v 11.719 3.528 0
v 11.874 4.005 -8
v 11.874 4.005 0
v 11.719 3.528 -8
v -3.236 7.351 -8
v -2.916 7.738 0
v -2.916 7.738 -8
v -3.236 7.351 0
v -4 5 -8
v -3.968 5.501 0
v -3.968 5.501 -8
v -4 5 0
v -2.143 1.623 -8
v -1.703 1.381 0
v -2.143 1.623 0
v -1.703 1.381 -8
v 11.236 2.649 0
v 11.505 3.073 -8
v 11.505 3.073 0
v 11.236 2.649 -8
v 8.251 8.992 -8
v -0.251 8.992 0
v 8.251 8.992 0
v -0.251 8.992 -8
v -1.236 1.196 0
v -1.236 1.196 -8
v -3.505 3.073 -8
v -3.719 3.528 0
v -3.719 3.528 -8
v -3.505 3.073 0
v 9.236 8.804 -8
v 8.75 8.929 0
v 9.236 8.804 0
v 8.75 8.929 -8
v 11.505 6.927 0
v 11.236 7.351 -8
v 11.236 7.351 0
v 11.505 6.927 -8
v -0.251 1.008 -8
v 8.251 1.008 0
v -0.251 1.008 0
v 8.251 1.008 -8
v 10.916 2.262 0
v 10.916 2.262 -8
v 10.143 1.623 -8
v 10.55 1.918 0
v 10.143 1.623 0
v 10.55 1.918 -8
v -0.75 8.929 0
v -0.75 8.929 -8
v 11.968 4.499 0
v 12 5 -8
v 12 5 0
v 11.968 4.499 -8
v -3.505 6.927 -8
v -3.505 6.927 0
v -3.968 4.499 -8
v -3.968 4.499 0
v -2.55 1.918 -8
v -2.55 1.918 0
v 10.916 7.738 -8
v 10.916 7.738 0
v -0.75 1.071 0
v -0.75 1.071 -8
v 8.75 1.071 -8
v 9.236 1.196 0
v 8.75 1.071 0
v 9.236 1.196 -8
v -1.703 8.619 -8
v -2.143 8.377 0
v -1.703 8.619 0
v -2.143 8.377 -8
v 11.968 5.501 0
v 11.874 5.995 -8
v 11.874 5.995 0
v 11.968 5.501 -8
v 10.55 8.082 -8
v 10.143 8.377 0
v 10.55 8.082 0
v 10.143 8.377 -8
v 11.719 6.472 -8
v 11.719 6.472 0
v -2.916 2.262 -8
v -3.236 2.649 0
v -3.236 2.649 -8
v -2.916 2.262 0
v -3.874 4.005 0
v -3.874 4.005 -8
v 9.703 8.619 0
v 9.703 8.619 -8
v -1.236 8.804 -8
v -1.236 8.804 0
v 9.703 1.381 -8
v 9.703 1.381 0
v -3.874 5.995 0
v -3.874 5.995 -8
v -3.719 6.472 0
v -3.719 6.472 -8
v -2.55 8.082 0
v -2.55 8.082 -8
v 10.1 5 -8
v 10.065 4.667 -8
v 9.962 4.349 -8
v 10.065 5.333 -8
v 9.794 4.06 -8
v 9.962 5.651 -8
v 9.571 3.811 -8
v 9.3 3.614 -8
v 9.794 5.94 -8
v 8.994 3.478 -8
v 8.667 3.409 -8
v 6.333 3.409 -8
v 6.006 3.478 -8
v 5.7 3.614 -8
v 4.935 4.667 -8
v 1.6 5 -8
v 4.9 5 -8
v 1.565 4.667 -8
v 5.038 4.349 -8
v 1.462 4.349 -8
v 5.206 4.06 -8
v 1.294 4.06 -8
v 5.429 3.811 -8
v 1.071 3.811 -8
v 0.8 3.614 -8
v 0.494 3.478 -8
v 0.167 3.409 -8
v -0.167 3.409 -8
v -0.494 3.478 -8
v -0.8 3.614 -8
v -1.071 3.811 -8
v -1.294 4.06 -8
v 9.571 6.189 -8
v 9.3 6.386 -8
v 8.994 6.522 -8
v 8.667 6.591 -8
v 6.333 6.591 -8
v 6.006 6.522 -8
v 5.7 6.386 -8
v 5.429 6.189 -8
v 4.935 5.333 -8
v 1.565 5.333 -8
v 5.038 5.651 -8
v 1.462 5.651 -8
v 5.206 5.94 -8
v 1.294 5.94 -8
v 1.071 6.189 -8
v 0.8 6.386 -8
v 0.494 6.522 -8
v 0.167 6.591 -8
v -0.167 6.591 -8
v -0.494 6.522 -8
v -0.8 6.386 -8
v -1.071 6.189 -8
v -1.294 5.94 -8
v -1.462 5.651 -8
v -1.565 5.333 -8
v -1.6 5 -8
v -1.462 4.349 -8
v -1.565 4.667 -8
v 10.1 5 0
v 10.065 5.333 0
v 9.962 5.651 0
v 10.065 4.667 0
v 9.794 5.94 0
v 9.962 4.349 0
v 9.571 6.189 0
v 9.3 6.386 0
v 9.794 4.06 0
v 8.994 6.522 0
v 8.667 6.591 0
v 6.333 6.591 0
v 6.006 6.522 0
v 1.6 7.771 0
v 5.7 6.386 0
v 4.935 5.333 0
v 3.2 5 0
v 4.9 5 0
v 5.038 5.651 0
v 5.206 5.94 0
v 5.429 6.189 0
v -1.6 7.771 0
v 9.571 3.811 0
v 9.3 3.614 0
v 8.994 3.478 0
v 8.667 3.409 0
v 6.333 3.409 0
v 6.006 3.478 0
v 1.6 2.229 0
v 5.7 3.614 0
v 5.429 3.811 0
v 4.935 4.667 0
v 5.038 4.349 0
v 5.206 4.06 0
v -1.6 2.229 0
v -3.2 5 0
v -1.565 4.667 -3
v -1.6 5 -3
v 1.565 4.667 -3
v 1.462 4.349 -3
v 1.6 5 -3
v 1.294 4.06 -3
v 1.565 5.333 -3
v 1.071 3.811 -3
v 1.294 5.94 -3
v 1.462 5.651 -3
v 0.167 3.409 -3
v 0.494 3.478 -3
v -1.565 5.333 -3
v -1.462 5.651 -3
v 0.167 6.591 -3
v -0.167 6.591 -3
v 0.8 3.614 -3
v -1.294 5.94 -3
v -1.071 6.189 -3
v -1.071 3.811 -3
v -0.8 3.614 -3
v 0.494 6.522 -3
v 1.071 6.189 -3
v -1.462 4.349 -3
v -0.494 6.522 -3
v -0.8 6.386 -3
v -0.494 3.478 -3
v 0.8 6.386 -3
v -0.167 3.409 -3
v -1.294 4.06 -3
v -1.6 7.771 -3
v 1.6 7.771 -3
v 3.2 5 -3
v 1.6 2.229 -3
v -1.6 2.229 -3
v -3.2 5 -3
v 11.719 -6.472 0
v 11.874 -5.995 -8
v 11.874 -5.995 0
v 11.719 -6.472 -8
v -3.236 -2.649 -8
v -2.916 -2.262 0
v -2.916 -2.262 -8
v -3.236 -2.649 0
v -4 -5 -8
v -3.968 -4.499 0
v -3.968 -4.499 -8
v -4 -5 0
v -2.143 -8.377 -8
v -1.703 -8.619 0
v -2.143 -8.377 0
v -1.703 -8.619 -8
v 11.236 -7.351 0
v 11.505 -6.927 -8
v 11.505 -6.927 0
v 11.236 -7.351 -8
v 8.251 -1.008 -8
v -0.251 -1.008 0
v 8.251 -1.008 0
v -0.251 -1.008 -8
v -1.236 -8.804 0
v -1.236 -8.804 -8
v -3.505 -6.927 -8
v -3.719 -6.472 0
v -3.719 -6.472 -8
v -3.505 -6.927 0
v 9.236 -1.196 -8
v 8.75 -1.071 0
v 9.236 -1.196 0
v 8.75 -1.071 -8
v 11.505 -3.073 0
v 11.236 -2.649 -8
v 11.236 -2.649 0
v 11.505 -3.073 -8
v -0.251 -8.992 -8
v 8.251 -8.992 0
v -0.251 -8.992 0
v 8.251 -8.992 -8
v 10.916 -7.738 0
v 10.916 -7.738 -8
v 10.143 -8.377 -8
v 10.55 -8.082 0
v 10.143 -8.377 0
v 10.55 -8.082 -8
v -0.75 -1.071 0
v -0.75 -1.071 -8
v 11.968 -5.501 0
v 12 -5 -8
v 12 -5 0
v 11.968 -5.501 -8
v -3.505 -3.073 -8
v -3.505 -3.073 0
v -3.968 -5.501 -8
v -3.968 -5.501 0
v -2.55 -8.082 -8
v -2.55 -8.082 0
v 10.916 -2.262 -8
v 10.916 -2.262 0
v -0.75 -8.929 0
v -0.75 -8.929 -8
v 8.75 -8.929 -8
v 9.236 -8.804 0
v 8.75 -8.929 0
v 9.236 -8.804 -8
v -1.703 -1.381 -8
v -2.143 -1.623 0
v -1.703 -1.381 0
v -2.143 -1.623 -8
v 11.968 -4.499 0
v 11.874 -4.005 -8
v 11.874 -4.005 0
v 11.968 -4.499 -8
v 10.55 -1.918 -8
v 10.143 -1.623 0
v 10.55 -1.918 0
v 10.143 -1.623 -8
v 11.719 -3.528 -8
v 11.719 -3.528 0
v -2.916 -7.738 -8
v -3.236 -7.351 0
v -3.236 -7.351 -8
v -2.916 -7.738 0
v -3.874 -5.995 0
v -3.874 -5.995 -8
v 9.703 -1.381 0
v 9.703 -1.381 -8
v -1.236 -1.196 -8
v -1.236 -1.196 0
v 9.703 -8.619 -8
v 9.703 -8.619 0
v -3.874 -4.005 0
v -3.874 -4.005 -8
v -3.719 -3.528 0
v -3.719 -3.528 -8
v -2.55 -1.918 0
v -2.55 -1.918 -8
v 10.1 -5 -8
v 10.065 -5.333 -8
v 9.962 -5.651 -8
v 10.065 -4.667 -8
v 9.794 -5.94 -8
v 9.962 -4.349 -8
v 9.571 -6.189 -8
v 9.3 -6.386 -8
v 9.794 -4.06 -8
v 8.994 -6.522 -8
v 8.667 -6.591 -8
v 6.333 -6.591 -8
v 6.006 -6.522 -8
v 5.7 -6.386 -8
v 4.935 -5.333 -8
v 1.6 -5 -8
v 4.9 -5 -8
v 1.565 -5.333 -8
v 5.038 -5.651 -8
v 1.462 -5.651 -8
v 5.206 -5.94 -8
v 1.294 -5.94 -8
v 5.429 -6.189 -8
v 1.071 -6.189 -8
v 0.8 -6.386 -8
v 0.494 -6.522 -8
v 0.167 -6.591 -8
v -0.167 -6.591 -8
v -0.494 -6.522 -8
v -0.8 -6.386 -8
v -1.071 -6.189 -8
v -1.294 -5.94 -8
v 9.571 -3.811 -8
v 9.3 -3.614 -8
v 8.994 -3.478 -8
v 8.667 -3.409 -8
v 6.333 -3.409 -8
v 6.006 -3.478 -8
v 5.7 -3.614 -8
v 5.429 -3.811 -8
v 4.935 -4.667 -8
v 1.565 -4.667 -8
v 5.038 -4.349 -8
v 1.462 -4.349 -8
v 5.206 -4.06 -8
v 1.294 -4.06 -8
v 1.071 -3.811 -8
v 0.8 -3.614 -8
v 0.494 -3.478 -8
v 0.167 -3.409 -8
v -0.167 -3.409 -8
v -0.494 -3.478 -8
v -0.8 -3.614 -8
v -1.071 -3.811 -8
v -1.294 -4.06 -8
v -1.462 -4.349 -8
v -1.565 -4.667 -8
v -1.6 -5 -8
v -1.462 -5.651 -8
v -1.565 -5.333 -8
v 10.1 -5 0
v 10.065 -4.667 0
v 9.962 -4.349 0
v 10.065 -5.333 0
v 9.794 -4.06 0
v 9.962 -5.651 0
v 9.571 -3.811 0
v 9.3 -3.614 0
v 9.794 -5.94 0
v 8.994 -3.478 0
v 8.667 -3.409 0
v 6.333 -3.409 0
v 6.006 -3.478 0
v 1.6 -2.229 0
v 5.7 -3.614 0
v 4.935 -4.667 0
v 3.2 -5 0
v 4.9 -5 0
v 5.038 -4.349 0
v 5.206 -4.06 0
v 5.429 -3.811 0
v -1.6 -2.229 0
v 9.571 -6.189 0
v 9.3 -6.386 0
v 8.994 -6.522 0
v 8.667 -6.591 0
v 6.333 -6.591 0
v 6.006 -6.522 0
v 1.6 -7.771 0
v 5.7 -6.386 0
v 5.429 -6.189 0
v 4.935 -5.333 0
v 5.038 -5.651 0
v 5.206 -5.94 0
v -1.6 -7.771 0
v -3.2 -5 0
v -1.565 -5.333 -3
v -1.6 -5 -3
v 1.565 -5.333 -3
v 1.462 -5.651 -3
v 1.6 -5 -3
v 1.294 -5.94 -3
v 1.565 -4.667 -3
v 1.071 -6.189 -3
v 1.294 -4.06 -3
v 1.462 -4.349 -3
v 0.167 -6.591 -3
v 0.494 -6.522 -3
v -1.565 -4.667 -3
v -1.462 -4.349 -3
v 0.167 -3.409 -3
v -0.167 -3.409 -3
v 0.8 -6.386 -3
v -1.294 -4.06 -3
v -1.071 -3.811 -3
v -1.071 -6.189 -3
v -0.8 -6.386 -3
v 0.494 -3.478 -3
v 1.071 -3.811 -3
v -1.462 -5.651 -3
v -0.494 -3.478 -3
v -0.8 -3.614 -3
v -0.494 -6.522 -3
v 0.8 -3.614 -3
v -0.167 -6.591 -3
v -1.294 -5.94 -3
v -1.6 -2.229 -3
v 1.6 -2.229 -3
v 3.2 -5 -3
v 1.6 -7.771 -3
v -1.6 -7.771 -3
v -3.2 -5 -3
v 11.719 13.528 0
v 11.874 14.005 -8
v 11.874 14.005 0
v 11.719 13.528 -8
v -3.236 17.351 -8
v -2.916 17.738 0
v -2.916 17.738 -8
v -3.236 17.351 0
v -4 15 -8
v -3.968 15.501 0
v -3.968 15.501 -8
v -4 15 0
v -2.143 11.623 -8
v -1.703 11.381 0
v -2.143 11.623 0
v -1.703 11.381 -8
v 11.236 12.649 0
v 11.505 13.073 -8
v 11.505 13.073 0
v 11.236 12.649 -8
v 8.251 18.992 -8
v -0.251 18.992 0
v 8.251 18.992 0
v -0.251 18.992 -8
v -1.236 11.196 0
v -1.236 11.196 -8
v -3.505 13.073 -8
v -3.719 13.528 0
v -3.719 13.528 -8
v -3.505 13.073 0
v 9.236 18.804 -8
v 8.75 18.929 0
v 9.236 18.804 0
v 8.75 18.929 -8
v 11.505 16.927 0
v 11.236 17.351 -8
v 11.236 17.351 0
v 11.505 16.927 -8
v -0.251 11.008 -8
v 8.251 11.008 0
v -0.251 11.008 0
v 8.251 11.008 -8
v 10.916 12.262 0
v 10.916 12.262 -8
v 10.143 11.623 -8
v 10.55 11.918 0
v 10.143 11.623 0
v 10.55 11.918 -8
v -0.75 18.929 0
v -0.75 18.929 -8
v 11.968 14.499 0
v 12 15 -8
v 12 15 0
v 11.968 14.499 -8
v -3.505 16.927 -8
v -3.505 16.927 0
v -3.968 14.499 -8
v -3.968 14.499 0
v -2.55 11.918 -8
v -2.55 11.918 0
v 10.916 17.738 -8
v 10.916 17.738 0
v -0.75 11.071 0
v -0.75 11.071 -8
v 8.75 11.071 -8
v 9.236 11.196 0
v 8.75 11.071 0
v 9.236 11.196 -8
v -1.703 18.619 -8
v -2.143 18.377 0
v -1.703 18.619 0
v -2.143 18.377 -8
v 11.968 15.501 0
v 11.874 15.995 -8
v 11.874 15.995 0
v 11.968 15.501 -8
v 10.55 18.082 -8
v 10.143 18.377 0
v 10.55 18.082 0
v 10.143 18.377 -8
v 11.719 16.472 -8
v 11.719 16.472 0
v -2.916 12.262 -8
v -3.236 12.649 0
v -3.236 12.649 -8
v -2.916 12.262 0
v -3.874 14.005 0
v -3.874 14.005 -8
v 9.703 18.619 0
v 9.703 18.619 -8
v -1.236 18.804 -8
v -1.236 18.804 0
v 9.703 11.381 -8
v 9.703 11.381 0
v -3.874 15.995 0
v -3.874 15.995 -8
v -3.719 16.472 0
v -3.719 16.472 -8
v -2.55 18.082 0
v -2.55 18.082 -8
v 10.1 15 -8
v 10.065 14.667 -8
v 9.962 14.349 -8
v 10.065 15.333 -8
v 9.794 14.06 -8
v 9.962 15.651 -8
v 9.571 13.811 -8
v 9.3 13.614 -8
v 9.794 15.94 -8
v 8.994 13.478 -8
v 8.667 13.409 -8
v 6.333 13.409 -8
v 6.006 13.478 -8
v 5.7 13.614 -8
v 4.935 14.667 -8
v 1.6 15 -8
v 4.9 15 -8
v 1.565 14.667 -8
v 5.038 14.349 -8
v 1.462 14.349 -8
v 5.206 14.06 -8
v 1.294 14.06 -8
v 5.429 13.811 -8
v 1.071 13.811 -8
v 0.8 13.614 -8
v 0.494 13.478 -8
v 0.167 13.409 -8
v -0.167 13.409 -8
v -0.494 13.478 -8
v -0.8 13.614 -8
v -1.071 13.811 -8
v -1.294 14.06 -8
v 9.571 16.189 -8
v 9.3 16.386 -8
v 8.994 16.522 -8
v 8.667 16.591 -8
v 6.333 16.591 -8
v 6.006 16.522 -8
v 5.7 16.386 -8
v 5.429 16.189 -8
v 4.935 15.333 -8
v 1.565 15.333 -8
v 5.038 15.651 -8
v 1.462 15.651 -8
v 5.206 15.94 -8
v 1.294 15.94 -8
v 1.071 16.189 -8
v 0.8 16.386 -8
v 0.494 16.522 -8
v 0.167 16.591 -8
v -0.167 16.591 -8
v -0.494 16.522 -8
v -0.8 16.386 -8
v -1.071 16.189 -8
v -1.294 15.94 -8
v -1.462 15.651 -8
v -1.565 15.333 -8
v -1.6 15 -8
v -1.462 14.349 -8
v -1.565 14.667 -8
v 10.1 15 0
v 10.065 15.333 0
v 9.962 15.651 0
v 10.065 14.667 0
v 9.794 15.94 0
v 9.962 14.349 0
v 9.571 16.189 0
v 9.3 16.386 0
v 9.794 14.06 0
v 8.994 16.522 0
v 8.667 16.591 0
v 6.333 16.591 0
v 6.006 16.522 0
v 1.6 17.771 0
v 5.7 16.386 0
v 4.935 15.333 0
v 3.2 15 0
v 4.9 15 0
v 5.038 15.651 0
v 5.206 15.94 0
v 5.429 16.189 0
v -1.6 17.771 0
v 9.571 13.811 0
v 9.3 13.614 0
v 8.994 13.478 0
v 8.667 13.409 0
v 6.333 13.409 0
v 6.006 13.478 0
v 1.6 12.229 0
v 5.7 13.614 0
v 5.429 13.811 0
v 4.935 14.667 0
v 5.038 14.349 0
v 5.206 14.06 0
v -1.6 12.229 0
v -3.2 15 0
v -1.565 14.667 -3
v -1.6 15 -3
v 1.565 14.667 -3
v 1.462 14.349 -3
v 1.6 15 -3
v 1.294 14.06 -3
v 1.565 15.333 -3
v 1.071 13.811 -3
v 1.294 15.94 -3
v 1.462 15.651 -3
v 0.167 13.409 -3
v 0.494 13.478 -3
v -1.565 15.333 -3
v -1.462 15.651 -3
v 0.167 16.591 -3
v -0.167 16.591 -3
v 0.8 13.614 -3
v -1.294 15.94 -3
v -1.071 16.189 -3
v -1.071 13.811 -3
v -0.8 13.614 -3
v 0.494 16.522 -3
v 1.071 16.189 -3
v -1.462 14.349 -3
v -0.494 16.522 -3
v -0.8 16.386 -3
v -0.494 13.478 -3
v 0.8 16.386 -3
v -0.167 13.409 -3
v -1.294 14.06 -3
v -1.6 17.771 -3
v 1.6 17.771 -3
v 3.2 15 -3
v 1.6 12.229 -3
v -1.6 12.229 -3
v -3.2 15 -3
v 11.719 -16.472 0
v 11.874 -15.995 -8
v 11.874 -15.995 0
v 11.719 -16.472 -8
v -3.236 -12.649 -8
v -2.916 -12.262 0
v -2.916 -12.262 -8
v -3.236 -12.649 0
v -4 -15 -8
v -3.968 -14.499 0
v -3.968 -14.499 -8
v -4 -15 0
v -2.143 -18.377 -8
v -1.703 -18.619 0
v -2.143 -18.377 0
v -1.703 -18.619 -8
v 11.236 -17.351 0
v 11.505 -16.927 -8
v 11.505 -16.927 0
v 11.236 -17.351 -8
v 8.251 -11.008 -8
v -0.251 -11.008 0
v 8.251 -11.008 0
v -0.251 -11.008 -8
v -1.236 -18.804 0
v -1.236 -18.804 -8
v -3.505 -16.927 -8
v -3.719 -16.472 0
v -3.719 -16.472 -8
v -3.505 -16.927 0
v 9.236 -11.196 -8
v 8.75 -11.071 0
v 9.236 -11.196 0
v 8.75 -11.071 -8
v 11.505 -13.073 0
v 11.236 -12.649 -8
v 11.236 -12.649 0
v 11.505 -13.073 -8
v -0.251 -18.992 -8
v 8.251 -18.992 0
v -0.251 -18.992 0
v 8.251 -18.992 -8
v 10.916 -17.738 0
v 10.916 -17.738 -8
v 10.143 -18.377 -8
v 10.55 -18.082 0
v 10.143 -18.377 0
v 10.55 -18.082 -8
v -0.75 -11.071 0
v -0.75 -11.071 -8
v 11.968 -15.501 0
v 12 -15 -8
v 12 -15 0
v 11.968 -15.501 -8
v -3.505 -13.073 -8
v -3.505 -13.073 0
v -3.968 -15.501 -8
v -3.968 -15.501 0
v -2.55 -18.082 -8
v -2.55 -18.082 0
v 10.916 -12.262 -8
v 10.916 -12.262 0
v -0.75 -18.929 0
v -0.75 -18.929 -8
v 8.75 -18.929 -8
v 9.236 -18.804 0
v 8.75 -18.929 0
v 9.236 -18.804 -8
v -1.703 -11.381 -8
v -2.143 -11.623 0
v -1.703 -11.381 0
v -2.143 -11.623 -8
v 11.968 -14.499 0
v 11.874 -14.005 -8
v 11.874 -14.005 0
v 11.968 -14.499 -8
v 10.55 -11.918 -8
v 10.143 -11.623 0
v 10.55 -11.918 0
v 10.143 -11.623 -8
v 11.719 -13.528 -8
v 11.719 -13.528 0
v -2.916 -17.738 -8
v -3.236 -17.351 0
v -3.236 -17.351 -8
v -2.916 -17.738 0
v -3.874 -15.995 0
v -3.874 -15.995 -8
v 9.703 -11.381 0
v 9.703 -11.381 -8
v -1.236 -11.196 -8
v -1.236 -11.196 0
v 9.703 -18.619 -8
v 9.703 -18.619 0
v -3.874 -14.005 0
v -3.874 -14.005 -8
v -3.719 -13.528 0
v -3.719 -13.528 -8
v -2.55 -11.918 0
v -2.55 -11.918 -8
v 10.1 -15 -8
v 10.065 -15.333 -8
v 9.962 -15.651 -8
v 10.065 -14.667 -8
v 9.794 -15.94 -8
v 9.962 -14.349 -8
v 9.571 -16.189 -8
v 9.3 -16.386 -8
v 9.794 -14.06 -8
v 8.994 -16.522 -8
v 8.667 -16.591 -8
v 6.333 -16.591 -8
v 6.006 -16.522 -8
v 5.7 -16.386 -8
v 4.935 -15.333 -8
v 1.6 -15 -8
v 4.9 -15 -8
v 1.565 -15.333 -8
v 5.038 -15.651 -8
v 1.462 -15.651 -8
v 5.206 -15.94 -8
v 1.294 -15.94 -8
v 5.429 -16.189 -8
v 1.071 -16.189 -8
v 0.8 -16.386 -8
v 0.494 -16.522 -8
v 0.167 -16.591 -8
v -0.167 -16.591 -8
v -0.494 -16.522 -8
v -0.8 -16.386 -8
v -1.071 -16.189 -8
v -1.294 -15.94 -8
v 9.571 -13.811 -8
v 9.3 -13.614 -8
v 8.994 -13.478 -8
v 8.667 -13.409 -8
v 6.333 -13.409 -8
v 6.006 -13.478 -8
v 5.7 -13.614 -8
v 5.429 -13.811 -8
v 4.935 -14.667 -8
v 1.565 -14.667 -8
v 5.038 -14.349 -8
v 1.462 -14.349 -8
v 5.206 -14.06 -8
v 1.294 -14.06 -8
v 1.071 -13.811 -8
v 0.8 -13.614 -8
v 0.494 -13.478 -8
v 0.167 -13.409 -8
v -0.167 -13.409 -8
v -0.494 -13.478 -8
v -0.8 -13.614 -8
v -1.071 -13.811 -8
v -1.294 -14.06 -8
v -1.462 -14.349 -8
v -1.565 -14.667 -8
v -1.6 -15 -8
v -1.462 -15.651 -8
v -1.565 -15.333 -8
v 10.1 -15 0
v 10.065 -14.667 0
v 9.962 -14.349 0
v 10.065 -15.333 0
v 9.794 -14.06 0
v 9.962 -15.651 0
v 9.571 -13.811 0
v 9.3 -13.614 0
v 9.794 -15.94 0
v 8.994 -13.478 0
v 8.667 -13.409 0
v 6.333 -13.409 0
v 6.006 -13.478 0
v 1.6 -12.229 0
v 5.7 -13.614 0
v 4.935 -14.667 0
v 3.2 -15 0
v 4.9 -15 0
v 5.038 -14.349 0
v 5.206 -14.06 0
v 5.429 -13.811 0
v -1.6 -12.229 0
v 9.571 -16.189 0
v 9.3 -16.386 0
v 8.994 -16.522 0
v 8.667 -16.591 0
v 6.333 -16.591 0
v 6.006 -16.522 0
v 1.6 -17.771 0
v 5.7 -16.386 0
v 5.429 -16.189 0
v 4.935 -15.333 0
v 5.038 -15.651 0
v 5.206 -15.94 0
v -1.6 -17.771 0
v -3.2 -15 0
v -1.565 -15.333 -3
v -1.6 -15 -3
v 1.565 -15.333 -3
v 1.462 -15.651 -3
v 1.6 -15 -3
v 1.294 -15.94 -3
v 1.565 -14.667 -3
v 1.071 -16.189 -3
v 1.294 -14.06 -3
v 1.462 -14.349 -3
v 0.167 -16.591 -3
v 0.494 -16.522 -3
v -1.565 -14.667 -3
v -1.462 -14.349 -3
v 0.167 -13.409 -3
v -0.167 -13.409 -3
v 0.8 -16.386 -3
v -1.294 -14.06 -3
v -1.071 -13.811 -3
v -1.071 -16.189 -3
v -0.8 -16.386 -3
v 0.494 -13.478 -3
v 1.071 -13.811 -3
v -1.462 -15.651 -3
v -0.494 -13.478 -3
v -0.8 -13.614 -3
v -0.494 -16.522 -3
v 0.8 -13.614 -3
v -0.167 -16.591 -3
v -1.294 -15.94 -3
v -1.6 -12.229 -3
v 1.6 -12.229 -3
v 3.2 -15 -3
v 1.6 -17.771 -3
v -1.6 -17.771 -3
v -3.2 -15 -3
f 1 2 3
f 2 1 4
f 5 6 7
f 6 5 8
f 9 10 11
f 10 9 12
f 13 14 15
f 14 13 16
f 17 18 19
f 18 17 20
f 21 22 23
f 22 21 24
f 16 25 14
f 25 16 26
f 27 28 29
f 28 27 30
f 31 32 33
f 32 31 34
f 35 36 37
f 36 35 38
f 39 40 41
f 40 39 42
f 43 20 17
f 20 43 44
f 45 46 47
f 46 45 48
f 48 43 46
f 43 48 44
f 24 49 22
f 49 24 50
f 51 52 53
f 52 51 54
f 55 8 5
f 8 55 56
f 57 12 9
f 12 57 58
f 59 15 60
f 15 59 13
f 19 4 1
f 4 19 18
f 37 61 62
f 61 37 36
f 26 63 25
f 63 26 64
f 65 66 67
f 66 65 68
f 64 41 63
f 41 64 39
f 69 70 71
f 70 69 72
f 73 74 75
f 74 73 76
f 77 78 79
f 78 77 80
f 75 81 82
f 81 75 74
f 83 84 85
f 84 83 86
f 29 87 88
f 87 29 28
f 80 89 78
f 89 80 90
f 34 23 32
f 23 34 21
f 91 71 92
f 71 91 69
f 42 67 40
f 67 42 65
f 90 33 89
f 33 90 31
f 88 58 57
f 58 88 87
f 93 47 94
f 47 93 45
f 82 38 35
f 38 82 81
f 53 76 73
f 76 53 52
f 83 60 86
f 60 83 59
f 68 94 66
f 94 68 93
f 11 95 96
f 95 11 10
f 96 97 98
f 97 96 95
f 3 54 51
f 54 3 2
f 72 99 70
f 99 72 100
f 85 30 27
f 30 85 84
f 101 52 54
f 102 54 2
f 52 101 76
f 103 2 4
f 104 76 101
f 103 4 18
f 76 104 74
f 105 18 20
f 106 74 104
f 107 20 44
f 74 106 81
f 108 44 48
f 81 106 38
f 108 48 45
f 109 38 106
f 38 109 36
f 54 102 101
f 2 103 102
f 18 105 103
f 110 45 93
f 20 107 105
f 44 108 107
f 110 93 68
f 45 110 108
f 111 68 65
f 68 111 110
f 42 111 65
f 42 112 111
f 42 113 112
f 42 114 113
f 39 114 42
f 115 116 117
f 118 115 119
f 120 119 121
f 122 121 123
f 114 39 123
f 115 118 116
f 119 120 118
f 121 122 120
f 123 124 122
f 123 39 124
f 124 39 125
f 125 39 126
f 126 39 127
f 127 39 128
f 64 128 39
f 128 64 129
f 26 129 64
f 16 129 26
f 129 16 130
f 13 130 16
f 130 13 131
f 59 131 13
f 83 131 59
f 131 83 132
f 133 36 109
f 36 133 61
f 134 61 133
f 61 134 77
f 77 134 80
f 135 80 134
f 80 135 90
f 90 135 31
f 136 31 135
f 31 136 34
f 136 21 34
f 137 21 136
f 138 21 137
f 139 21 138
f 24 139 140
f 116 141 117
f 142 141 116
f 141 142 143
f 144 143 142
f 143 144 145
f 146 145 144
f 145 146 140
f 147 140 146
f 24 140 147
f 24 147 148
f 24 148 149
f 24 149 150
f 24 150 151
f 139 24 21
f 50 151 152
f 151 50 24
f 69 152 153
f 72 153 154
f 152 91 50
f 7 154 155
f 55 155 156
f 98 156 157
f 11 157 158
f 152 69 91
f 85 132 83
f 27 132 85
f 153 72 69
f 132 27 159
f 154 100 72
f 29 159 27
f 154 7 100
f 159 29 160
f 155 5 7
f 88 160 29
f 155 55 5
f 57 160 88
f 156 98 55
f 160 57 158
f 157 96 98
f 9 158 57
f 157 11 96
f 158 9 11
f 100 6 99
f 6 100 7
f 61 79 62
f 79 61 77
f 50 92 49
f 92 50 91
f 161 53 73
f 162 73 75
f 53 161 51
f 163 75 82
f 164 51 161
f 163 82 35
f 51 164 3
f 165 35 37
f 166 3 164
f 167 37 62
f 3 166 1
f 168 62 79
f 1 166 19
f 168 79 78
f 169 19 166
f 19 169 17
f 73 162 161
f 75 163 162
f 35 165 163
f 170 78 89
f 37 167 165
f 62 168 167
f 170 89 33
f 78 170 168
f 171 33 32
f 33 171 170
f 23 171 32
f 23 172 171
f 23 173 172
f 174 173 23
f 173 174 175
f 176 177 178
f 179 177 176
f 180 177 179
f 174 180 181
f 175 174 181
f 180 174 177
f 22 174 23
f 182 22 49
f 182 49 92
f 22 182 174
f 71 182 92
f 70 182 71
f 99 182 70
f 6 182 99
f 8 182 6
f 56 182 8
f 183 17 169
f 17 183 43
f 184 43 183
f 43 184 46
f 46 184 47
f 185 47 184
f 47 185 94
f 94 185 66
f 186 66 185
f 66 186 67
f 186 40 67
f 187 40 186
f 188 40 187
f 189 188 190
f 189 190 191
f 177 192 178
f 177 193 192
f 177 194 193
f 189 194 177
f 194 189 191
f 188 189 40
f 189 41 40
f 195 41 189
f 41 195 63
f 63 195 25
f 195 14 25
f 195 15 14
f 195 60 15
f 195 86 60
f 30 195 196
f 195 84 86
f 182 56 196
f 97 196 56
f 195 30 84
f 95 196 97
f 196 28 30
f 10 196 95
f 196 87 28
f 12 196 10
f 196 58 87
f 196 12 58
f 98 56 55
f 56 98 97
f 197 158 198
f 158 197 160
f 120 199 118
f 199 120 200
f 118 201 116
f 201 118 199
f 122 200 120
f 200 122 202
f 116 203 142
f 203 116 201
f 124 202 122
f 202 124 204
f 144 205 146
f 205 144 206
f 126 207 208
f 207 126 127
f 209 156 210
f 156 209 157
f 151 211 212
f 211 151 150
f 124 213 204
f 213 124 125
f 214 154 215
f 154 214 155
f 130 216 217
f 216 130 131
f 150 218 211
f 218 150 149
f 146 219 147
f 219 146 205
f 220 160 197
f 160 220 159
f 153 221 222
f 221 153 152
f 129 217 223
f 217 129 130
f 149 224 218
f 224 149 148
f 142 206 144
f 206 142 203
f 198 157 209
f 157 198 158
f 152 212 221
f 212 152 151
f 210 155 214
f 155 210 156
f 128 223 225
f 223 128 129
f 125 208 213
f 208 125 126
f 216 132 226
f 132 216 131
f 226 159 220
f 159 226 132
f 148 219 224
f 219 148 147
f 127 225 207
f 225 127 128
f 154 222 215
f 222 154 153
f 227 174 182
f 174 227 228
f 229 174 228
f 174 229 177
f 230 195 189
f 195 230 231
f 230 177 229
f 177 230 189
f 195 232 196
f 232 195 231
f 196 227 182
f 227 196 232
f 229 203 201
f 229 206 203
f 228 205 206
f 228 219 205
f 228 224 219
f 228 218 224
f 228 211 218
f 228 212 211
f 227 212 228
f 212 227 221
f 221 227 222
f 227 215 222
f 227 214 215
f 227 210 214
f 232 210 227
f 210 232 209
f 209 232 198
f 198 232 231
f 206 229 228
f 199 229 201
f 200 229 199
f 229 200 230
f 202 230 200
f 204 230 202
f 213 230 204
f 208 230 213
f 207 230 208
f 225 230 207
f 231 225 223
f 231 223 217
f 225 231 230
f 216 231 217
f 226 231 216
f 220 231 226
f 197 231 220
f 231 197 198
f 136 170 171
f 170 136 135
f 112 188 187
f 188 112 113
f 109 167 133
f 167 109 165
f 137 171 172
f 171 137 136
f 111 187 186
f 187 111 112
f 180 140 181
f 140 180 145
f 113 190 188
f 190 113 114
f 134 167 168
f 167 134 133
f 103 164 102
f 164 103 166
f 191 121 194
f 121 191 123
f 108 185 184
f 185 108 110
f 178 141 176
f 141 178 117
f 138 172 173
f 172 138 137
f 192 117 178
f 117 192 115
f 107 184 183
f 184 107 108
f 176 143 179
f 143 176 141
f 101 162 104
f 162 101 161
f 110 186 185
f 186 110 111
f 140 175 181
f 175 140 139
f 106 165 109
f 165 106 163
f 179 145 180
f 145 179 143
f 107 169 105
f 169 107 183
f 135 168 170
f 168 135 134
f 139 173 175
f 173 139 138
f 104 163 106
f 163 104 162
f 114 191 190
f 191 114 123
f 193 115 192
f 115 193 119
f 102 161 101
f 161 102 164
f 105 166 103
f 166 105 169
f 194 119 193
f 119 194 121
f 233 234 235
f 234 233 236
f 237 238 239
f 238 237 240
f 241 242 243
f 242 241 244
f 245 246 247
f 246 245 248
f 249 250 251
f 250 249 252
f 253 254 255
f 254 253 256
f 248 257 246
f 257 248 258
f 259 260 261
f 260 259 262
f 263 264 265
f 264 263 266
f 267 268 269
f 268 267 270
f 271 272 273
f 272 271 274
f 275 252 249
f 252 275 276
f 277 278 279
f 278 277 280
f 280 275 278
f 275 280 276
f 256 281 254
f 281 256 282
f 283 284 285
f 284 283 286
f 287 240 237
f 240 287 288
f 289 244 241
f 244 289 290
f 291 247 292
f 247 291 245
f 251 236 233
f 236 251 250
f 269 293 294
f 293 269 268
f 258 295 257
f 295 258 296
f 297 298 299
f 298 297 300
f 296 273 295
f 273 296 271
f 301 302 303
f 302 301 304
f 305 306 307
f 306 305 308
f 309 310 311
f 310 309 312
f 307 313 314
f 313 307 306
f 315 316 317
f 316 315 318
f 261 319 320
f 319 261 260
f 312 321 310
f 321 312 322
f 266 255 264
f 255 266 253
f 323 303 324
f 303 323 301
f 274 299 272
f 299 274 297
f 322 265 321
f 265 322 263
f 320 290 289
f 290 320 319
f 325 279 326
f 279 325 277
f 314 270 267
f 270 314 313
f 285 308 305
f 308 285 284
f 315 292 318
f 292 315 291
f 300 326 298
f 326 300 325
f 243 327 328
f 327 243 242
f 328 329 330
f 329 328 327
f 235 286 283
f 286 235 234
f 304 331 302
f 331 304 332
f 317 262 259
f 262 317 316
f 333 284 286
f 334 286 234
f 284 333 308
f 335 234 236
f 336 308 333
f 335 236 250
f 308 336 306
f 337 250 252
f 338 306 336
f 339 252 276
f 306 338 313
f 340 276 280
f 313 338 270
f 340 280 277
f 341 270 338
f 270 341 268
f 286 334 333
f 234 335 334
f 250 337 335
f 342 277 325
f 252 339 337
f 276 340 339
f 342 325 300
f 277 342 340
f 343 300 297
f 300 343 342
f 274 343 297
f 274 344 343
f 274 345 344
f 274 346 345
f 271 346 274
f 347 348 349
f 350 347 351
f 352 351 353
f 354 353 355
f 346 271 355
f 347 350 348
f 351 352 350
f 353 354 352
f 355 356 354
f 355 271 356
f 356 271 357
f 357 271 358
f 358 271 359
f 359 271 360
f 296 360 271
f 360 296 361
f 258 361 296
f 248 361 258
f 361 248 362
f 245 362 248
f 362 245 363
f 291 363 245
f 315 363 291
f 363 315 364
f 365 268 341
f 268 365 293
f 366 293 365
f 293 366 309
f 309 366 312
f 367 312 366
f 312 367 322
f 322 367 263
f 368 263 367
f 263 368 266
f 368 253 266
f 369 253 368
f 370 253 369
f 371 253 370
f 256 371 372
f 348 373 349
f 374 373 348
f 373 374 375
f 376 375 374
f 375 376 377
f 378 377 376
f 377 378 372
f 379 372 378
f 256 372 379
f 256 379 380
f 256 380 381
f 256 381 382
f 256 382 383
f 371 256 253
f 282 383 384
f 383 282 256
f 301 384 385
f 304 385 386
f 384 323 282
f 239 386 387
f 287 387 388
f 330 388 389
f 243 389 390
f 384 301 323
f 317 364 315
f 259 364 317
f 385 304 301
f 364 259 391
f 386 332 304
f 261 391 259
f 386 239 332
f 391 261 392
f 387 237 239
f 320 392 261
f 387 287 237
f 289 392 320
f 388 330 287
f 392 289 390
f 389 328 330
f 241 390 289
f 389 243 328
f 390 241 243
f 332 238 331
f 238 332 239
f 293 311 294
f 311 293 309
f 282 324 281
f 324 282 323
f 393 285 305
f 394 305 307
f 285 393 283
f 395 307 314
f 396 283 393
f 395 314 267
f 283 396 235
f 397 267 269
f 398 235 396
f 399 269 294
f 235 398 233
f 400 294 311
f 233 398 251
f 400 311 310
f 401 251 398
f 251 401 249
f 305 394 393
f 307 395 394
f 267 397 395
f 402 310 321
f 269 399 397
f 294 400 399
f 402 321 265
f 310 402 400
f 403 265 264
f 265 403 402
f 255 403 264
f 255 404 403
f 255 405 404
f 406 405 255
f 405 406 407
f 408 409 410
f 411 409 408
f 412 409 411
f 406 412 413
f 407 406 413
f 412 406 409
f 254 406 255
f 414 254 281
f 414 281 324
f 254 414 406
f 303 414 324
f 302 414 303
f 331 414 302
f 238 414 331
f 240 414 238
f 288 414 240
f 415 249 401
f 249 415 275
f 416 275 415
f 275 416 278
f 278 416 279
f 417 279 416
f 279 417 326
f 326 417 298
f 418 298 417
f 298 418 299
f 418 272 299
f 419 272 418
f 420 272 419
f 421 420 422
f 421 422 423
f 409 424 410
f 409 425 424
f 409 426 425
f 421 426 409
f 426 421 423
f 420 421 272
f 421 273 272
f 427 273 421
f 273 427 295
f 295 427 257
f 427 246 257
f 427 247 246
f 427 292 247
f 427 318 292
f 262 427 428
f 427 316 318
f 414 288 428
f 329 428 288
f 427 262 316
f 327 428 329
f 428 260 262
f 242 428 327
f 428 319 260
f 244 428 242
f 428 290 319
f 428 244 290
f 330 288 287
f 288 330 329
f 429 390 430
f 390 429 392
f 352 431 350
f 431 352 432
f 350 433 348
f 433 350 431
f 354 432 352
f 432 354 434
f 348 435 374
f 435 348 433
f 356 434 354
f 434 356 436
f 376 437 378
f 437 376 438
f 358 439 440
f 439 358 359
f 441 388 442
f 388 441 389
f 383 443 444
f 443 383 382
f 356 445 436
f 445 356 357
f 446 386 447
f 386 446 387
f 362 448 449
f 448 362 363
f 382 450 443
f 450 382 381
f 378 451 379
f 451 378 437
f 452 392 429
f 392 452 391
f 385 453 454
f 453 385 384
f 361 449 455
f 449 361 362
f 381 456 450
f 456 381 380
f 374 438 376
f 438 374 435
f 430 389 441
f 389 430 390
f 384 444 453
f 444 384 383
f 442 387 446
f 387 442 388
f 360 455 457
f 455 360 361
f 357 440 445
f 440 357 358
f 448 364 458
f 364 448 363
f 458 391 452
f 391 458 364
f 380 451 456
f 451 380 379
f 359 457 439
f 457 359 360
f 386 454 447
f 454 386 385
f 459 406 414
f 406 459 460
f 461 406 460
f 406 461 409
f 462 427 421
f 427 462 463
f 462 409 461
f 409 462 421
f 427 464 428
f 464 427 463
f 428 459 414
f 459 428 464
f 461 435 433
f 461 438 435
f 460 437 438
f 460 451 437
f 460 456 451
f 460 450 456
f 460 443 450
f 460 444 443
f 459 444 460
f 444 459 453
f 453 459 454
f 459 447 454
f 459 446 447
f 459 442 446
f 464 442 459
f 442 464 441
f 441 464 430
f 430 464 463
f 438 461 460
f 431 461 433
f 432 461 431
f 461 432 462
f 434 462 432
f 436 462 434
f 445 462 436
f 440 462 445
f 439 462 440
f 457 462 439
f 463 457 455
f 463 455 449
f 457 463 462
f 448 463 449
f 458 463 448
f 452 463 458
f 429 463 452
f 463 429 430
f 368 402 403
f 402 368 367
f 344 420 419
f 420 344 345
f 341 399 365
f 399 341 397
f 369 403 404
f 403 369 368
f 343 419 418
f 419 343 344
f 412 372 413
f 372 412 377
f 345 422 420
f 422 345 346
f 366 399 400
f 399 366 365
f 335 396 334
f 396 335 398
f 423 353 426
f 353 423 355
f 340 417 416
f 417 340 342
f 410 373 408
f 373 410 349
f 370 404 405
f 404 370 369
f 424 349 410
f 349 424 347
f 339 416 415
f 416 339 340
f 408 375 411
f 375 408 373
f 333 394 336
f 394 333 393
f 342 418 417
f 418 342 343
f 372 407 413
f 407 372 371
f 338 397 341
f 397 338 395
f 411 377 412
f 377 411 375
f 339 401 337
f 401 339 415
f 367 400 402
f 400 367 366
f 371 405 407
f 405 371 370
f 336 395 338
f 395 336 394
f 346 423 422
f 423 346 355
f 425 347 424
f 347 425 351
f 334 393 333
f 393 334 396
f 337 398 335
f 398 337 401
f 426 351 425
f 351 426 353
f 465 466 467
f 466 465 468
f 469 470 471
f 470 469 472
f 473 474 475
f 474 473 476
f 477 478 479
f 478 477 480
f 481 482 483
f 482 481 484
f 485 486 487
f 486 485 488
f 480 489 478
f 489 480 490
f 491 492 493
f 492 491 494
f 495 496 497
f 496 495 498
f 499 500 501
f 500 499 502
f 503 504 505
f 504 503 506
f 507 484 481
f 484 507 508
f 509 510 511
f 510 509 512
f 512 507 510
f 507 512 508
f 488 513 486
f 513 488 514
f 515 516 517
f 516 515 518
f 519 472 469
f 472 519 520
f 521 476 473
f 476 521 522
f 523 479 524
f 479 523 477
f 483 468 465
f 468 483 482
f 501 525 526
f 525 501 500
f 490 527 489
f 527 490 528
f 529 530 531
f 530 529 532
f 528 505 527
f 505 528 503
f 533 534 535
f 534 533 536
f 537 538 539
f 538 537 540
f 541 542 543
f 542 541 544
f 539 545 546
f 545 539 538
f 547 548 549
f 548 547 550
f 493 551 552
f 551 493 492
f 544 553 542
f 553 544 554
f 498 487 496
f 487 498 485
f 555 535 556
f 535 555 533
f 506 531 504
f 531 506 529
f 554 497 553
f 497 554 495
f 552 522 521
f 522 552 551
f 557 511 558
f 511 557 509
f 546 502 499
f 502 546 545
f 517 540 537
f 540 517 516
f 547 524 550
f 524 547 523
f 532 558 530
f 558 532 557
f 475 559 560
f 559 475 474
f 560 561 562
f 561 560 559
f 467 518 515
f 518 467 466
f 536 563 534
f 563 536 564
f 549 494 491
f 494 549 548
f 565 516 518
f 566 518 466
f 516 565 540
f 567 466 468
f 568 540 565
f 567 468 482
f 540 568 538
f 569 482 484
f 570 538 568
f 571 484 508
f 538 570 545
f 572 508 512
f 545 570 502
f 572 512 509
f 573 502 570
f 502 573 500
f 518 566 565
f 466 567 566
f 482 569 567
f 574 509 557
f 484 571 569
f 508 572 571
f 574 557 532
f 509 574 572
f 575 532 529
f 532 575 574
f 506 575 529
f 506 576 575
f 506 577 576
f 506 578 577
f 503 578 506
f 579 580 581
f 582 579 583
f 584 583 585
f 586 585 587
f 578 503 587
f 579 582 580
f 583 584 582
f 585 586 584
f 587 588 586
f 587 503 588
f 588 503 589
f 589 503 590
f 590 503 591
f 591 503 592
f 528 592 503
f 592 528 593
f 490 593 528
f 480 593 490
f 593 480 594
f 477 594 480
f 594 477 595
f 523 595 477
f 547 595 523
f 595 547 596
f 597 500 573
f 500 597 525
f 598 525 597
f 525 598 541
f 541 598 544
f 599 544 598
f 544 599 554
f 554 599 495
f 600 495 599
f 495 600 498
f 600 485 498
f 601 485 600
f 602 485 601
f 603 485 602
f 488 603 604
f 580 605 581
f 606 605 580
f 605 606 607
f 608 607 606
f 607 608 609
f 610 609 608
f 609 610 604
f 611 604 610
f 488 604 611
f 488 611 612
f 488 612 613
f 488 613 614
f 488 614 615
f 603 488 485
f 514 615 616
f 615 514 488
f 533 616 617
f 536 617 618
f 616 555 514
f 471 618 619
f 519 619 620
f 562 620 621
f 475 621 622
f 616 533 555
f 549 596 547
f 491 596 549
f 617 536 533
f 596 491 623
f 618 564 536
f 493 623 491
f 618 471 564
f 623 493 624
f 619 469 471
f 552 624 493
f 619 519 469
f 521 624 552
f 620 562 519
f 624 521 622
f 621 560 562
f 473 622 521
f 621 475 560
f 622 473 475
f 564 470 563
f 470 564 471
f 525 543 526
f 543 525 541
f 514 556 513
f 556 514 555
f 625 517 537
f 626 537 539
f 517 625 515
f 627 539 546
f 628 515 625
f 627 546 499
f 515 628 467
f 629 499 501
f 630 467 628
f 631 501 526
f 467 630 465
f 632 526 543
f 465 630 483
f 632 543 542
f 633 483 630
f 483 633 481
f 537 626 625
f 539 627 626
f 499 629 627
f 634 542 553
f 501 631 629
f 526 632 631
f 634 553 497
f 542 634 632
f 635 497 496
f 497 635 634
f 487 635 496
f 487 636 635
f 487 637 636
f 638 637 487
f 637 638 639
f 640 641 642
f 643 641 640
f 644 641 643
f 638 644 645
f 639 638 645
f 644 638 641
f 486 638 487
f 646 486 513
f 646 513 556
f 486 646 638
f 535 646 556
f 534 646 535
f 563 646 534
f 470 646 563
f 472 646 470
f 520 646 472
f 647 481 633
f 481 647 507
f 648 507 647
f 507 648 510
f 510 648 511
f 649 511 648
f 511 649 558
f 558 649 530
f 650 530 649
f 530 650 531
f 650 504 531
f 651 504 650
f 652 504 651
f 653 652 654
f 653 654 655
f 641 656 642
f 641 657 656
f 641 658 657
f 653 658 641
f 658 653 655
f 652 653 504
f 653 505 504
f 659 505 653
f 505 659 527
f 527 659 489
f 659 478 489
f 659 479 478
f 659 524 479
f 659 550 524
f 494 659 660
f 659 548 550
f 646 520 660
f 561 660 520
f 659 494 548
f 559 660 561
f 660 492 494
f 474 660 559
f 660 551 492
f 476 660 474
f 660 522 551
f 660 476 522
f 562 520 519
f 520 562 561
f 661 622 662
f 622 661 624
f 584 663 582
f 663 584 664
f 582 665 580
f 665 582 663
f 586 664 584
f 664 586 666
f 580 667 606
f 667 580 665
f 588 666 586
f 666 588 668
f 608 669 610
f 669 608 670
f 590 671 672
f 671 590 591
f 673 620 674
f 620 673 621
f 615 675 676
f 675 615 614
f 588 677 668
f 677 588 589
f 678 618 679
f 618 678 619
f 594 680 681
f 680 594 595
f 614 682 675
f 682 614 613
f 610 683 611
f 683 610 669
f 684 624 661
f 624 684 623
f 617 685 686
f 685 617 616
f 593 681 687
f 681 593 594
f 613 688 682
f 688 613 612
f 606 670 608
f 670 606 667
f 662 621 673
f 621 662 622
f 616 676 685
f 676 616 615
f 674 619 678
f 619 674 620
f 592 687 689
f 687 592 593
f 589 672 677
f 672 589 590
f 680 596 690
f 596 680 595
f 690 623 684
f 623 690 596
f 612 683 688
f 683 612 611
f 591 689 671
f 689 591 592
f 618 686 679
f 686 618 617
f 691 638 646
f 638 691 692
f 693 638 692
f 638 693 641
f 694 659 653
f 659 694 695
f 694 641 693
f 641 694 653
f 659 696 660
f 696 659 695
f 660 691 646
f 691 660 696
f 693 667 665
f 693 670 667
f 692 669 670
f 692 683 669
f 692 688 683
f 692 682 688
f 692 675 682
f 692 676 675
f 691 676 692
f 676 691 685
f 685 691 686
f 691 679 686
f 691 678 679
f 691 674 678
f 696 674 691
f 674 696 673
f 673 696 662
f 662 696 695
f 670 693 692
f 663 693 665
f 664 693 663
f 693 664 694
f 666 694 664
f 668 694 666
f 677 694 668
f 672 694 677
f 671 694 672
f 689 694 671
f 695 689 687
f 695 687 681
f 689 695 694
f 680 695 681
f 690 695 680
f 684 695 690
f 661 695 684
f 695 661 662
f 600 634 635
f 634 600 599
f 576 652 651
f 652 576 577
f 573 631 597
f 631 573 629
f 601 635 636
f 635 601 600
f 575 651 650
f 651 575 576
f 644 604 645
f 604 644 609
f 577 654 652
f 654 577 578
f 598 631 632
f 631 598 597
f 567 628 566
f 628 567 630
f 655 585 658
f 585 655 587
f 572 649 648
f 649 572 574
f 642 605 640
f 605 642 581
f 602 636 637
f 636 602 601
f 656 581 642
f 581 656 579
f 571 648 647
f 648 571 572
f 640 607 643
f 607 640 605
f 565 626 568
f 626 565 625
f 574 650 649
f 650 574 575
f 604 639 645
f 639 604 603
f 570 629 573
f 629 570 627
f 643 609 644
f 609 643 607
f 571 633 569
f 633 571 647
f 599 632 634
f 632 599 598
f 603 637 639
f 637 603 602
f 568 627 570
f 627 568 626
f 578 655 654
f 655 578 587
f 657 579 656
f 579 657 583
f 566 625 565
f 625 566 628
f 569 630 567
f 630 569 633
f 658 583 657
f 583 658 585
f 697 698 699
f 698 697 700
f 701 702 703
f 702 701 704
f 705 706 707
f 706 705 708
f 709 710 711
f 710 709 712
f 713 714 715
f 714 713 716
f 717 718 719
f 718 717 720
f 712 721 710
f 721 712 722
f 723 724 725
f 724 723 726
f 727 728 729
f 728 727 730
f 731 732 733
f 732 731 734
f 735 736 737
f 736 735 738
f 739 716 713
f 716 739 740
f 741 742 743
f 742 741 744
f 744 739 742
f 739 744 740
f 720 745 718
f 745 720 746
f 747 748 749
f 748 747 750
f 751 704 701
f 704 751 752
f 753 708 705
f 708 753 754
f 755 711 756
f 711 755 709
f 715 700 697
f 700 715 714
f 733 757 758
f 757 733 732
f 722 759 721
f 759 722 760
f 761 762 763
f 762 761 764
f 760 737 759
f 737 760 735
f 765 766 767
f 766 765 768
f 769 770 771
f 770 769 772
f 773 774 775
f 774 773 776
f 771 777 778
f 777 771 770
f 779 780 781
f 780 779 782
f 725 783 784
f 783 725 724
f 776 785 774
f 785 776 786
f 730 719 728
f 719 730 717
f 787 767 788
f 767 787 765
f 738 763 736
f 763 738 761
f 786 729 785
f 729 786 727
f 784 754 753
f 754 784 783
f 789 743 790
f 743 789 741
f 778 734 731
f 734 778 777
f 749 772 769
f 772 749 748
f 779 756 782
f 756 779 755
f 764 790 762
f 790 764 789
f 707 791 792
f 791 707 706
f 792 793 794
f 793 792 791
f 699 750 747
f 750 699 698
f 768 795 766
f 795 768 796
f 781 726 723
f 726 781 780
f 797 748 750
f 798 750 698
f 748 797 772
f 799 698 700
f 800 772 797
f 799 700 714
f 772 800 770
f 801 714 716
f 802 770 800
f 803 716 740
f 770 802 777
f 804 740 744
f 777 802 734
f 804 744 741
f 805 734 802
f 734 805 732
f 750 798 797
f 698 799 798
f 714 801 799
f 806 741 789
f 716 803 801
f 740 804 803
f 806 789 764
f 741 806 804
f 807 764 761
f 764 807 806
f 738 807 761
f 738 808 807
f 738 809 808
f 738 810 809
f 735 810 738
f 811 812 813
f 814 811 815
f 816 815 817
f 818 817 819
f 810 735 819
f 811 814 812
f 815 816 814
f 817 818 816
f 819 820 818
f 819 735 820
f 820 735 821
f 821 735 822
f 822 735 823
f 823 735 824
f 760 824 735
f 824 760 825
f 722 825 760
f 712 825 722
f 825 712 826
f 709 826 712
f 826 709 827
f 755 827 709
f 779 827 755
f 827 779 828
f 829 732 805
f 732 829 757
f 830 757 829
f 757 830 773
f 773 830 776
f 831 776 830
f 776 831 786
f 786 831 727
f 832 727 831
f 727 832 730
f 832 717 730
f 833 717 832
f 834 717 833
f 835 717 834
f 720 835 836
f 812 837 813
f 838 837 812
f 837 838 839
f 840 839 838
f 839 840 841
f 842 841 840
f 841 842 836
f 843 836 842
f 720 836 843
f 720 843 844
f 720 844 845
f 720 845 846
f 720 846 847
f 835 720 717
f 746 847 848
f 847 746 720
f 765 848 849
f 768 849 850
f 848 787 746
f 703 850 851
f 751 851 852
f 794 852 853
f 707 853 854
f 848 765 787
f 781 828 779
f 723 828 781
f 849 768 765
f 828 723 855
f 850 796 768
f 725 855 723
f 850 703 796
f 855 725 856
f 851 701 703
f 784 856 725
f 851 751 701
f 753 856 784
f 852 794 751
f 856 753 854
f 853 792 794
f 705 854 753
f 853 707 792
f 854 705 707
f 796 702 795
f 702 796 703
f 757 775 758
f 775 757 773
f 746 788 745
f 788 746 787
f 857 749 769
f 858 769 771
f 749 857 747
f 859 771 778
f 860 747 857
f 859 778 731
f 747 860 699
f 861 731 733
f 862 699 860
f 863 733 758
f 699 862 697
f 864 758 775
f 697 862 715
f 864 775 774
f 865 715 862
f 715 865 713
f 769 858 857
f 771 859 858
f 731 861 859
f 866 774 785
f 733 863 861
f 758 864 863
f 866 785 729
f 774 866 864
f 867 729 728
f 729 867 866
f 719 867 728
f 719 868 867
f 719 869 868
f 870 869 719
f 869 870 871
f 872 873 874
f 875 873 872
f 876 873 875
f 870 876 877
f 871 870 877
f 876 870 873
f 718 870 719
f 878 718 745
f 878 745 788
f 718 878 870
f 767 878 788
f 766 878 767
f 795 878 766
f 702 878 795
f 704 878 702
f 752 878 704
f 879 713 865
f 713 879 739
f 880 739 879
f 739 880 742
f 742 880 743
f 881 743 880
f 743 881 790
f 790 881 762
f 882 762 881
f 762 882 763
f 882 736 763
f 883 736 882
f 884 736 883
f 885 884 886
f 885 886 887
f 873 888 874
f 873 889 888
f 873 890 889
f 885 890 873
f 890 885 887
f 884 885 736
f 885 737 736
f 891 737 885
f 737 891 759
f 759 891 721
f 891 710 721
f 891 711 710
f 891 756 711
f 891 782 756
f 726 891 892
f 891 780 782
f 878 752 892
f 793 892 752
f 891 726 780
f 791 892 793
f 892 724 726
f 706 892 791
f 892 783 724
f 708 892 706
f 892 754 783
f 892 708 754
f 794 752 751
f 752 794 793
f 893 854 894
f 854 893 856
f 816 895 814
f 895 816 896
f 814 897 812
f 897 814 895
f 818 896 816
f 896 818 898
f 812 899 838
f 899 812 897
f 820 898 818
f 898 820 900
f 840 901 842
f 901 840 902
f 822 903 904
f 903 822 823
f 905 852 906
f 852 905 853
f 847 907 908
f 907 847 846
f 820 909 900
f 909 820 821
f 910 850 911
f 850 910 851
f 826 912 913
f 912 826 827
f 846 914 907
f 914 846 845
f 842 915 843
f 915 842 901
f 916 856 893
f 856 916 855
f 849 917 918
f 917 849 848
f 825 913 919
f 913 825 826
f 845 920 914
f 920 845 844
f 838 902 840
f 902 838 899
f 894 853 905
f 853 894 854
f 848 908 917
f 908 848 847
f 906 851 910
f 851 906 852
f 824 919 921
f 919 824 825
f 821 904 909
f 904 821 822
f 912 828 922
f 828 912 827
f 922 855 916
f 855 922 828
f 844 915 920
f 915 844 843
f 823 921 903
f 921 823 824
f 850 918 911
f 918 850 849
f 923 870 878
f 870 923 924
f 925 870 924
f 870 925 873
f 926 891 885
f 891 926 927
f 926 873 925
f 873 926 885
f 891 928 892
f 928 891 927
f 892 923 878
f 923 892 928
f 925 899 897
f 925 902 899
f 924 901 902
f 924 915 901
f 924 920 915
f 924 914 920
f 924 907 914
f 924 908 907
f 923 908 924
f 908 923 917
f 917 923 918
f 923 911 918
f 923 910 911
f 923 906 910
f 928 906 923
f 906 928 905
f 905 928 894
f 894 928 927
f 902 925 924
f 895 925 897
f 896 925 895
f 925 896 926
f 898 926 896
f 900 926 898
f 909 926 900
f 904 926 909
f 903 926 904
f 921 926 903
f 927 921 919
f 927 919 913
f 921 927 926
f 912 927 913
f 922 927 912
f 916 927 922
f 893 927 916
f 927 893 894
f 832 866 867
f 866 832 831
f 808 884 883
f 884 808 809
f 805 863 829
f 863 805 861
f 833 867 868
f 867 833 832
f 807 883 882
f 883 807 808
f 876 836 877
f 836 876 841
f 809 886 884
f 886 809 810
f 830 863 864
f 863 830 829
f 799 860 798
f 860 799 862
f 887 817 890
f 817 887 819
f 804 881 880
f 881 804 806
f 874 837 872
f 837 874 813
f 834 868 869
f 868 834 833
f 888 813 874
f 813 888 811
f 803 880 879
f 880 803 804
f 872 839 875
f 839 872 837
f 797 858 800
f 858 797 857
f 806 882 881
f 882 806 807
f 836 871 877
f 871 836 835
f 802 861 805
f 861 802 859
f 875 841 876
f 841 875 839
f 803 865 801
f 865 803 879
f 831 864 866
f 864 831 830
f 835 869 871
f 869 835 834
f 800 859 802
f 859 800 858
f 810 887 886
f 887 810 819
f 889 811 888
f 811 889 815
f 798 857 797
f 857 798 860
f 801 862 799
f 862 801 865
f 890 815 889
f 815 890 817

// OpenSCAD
module porta_melzi(){
	rotate([180,0,0])difference(){
		hull(){
			cylinder(h=8,r=4,$fn=50);
			translate([8,0,0])cylinder(h=8,r=4,$fn=50);
		}
		
		cylinder(h=15,r=1.6,$fn=30);
		translate([0,0,-2])cylinder(h=5,r=3.2,$fn=6);
		hull(){
			translate([8.5,0,-2])cylinder(h=15,r=1.6,$fn=30);
			translate([6.5,0,-2])cylinder(h=15,r=1.6,$fn=30);
		}
	}
}



translate([0,5,0])porta_melzi();
translate([0,-5,0])porta_melzi();
translate([0,15,0])porta_melzi();
translate([0,-15,0])porta_melzi();
